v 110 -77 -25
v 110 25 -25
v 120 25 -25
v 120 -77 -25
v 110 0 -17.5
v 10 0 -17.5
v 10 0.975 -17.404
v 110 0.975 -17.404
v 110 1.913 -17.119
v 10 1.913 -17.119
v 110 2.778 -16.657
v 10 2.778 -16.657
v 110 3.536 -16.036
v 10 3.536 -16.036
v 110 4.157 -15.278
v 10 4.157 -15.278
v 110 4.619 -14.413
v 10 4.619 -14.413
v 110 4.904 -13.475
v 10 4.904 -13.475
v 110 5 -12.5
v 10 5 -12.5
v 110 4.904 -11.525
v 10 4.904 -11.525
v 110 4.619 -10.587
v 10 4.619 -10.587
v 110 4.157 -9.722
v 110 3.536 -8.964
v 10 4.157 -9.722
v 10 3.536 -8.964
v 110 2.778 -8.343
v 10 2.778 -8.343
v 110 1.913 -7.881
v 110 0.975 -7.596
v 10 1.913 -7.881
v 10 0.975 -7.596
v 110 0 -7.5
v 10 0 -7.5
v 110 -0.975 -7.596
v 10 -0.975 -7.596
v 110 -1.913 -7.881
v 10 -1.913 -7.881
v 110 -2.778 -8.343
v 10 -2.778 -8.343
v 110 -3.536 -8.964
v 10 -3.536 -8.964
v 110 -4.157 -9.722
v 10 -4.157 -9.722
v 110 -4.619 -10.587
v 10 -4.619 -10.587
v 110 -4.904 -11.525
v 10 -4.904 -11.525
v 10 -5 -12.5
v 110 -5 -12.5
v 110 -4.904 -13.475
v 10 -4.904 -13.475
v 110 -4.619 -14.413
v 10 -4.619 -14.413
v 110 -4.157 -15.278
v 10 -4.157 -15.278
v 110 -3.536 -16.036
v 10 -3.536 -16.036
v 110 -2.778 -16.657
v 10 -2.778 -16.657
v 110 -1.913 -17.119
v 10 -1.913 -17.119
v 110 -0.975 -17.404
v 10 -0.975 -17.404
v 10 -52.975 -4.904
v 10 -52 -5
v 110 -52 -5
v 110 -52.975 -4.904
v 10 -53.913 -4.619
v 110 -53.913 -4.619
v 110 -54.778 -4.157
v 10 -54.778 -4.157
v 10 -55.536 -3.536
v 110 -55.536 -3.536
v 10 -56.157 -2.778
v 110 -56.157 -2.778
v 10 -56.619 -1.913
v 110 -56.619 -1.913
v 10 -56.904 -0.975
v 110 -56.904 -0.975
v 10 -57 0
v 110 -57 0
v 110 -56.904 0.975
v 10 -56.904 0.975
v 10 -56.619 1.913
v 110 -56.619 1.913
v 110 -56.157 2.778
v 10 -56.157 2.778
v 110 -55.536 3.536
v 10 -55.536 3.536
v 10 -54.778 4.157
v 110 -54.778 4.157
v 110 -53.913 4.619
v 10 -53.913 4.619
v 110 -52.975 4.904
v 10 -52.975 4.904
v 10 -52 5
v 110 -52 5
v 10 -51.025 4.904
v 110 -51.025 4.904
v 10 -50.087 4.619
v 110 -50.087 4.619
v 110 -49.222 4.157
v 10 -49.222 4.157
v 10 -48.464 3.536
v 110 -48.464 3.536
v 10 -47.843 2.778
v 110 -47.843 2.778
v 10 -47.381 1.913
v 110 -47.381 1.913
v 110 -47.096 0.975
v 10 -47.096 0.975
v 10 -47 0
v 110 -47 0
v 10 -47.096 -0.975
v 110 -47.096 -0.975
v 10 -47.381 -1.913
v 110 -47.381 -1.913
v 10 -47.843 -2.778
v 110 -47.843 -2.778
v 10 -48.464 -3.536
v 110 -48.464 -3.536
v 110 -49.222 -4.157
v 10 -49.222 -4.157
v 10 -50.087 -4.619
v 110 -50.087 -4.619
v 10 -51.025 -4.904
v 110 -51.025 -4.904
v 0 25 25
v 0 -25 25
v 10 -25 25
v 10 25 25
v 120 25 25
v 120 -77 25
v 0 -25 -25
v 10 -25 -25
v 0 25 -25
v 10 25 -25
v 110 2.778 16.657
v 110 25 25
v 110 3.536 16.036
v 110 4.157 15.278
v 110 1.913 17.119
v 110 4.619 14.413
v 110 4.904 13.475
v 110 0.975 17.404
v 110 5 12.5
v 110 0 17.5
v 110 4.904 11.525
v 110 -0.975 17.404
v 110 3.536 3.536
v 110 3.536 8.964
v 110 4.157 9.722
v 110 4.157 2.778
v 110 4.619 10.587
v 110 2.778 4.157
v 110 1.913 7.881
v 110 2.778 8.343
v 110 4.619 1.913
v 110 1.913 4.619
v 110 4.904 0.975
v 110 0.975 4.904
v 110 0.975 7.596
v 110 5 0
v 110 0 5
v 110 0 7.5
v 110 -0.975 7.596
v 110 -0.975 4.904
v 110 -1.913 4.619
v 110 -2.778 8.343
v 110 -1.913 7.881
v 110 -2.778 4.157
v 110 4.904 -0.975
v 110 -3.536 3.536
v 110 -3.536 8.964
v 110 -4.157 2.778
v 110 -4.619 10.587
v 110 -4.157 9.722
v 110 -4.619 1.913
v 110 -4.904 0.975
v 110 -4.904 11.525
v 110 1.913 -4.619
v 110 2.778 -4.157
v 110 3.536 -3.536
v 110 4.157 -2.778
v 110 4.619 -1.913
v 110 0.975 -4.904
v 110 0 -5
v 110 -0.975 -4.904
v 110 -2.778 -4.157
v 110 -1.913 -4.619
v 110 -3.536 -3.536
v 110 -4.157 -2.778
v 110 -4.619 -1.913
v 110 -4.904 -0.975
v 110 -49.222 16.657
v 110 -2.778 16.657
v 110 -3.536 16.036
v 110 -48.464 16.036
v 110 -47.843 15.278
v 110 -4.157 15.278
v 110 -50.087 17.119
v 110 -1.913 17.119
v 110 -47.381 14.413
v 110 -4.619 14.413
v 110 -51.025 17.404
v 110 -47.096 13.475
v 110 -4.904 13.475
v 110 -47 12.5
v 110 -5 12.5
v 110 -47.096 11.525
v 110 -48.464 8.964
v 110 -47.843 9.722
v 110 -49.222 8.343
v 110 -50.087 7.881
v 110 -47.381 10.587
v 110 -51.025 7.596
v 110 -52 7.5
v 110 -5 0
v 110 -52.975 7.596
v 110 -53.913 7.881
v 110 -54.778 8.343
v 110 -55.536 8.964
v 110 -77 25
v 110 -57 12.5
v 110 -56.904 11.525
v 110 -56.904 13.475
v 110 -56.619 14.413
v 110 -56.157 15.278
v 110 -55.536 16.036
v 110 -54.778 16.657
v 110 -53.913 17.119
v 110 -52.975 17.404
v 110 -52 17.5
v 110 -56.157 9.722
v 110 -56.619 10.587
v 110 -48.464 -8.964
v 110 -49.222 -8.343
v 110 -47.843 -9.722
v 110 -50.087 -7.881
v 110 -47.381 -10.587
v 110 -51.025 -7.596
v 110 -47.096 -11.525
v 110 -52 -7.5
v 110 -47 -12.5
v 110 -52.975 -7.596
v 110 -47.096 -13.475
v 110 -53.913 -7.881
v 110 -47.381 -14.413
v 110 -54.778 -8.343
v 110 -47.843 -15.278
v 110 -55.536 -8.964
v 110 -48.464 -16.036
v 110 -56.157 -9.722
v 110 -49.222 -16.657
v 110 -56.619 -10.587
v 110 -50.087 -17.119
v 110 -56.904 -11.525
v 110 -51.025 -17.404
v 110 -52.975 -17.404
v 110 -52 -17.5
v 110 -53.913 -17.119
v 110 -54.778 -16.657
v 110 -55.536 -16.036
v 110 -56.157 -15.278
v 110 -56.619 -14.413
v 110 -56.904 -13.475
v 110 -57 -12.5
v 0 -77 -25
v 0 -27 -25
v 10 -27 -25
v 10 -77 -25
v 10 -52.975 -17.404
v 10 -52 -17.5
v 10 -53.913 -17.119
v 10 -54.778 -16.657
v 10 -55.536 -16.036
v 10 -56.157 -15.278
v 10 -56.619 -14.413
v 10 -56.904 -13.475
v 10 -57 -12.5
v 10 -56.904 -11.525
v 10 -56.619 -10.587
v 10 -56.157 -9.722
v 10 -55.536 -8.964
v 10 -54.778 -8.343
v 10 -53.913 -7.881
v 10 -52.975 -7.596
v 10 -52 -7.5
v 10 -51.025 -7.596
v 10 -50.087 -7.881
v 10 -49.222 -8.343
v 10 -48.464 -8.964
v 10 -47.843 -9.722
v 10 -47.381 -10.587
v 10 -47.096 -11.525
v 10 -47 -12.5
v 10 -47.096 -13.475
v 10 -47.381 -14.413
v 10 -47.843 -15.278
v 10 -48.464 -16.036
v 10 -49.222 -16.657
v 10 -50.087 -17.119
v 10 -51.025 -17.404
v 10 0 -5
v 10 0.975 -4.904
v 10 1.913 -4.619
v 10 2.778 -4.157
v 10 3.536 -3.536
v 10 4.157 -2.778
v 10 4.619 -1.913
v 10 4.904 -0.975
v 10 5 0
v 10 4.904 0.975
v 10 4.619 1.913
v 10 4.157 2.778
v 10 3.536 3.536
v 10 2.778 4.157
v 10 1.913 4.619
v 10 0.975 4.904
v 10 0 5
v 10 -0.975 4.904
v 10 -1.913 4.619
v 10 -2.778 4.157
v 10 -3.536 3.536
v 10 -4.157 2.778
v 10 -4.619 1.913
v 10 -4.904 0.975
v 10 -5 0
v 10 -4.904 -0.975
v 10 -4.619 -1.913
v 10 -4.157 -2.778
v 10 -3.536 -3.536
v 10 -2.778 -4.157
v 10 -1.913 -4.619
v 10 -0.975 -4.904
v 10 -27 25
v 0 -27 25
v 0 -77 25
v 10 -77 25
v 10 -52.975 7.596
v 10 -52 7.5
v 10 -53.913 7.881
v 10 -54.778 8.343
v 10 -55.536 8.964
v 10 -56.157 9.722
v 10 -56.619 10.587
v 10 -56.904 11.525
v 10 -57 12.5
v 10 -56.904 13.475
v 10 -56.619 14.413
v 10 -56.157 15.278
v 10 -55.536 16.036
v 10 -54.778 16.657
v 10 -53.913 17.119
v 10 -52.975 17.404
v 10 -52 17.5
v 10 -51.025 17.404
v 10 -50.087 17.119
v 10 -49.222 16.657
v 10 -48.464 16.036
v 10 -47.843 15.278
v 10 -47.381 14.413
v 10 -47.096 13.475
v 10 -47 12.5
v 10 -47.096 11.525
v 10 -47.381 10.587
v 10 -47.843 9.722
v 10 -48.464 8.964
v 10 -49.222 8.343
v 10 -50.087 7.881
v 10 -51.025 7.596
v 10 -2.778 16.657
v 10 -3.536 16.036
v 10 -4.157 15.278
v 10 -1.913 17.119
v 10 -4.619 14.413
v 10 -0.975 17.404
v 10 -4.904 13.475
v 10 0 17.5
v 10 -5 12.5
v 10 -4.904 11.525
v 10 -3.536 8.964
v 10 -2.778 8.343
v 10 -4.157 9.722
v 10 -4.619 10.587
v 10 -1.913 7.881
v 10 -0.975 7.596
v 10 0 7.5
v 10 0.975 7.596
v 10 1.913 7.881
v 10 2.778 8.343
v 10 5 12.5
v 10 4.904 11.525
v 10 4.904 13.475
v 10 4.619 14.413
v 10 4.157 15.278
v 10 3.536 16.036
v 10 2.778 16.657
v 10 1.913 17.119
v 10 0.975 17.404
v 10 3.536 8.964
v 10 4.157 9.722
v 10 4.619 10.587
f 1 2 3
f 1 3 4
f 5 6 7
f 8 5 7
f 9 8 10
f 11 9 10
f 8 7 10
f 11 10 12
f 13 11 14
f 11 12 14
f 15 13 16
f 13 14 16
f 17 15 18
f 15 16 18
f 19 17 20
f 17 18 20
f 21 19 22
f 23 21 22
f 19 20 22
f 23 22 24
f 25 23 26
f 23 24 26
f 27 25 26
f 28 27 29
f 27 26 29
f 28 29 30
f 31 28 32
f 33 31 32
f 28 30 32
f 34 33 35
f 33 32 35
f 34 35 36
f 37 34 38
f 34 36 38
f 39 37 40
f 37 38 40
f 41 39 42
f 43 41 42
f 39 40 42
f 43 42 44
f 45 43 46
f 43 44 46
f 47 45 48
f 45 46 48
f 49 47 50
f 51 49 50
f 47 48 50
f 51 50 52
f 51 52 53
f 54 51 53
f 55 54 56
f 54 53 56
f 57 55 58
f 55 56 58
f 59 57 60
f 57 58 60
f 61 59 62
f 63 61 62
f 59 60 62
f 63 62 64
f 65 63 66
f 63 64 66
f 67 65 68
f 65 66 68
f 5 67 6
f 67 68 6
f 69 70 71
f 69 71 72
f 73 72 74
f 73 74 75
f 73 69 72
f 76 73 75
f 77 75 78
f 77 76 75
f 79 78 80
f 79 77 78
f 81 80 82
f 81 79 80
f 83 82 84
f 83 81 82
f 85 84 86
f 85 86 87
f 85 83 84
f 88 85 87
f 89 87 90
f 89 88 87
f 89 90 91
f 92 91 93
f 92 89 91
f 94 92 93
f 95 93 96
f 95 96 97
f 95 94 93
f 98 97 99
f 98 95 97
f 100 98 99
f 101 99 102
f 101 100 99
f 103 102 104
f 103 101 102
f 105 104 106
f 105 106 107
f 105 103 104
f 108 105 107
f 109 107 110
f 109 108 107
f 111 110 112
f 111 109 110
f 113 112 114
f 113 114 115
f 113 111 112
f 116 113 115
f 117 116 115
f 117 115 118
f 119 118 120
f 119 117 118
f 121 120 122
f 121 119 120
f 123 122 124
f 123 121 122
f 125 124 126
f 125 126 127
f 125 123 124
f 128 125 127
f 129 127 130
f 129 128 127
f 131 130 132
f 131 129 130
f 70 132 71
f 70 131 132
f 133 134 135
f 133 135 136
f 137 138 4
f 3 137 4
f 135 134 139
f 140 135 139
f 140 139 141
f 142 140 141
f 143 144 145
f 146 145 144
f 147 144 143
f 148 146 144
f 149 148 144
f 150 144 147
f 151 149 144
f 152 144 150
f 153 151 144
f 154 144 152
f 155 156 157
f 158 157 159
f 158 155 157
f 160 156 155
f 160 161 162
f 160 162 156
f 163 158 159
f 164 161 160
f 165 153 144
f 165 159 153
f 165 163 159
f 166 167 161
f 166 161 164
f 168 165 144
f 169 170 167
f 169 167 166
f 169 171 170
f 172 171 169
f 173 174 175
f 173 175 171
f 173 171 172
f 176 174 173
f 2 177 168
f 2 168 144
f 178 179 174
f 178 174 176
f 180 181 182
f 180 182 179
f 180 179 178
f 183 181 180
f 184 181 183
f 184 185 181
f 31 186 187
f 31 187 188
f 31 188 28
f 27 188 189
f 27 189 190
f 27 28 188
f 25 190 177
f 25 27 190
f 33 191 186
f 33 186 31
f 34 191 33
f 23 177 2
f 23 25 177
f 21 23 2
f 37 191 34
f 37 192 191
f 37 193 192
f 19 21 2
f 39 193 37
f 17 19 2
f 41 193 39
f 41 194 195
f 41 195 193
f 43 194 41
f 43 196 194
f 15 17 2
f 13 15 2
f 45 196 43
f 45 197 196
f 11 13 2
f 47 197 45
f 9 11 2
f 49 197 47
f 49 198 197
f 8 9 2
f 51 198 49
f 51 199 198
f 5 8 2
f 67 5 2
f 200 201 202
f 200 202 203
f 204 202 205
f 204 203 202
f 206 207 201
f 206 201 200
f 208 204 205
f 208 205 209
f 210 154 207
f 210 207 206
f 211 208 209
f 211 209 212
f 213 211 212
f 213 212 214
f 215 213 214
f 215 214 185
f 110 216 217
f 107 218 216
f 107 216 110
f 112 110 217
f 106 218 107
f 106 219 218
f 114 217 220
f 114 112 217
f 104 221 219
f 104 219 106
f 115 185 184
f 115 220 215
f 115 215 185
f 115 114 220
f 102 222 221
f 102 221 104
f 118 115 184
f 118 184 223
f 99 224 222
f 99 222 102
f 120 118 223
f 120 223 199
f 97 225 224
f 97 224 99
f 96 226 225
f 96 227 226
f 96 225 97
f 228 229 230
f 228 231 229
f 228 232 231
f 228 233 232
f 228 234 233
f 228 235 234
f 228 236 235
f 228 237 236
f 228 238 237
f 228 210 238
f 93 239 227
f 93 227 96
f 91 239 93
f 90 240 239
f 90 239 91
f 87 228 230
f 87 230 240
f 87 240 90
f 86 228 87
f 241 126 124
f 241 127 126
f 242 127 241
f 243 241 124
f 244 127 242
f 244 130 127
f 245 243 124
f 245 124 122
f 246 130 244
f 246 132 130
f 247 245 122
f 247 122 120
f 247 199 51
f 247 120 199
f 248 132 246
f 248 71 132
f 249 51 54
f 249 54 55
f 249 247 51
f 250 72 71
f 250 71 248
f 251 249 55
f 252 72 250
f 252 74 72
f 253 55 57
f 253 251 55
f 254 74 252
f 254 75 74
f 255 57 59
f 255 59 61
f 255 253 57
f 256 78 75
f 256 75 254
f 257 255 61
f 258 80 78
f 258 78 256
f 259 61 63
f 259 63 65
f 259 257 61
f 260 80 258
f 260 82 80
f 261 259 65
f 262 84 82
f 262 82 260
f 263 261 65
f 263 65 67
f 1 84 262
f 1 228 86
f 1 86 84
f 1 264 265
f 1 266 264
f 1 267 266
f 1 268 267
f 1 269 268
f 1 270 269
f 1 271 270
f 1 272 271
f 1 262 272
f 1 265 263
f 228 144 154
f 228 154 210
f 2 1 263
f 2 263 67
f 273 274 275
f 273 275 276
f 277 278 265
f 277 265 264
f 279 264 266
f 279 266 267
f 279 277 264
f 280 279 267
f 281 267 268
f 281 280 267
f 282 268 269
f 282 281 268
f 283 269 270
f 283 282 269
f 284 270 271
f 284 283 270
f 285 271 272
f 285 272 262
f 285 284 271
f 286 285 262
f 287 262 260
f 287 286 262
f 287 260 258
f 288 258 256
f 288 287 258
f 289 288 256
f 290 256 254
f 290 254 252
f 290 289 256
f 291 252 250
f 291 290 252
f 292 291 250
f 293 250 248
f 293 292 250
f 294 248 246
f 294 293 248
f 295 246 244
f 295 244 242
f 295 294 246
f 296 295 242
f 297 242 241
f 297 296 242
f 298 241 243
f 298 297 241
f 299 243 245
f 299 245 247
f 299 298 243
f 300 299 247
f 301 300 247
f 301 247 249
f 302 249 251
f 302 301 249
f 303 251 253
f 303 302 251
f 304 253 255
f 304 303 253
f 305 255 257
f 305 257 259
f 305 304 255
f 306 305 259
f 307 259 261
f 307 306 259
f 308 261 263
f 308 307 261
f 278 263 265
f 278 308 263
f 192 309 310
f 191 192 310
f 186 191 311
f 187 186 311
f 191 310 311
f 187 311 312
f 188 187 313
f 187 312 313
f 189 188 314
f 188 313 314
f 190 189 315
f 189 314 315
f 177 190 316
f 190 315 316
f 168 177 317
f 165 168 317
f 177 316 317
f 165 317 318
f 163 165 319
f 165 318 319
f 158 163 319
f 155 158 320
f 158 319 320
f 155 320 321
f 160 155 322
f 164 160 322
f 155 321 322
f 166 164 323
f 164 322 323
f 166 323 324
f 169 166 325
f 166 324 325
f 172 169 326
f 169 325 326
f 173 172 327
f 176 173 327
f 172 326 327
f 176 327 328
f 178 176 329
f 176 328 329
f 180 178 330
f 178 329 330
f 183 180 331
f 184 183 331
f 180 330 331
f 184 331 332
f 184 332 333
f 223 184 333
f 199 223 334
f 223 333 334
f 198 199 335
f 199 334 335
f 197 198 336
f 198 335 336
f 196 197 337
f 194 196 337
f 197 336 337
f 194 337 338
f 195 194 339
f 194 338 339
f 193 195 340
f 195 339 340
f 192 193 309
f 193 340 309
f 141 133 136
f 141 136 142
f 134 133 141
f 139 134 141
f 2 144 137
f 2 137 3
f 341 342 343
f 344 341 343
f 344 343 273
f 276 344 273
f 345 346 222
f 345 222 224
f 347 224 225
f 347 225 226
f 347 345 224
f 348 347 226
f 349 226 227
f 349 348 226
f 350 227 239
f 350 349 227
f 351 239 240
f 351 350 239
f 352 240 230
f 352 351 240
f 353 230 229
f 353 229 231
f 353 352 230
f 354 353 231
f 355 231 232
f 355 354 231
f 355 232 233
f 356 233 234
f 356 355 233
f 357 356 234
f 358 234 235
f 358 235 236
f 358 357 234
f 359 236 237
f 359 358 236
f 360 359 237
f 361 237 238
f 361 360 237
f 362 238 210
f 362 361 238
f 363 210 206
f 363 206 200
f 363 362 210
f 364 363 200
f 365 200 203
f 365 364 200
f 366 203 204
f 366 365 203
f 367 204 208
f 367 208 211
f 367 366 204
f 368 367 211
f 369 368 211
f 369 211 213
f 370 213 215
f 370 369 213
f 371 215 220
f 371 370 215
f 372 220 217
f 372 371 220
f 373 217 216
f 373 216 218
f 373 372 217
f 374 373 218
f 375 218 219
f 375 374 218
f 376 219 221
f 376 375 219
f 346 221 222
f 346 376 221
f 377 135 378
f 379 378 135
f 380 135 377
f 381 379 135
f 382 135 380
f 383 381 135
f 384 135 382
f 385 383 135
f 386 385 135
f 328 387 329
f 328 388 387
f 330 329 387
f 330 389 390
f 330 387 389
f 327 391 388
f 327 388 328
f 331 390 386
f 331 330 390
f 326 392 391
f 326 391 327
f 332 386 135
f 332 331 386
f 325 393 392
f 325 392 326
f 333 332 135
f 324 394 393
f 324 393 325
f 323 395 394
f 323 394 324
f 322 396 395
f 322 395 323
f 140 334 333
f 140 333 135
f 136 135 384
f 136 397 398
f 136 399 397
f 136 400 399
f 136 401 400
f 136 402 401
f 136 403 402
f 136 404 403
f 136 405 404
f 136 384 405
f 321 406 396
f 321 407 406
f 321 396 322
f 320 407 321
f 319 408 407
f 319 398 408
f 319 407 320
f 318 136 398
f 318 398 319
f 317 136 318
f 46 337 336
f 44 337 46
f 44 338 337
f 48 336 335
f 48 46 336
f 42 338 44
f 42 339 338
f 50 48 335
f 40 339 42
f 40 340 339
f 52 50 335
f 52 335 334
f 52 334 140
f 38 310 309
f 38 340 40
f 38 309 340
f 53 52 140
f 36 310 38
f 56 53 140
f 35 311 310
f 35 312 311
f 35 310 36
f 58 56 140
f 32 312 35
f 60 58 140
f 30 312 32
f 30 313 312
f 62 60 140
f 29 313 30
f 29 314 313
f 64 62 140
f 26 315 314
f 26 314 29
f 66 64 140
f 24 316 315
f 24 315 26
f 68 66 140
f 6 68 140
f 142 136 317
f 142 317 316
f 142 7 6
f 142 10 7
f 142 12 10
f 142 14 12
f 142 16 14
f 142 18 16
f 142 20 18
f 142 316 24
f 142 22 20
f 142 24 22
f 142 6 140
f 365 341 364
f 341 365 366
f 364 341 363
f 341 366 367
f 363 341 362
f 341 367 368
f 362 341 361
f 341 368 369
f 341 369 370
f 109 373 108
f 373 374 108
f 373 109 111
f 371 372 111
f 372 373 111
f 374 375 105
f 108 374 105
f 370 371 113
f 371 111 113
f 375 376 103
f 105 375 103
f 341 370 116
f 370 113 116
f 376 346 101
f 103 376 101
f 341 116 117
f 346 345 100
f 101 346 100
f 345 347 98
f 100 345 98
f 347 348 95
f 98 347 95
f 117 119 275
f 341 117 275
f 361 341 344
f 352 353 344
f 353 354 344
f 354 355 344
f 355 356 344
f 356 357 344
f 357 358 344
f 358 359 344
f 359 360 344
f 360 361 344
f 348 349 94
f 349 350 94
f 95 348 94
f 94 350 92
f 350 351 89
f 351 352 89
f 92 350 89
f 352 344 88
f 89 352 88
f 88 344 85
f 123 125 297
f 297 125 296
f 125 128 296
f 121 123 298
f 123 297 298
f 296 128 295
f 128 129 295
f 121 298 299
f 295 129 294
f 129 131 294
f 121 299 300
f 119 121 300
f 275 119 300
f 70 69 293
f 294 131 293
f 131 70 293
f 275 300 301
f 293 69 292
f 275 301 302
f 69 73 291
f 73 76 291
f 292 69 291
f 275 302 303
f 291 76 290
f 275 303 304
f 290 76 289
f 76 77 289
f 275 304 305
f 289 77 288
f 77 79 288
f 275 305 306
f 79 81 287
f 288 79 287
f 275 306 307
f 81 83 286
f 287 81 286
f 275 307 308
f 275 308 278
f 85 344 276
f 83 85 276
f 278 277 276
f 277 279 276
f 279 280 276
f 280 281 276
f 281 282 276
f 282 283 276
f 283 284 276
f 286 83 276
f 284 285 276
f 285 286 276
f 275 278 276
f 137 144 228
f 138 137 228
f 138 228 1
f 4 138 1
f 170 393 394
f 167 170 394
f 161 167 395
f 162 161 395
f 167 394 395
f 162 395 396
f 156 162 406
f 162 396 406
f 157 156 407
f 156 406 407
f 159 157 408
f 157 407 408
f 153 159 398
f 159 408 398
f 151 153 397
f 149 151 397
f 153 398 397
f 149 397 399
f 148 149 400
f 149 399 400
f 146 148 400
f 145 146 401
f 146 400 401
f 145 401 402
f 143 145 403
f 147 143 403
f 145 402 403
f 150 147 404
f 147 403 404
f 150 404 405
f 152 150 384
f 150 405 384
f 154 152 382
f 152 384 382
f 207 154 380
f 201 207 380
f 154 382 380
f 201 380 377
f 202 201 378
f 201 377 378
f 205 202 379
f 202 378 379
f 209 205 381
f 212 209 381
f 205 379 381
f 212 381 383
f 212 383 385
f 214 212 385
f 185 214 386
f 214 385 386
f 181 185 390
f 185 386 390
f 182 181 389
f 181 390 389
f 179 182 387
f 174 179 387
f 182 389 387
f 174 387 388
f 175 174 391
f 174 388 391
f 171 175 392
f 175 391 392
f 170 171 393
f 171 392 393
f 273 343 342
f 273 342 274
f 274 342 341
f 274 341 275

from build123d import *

# Parameters (mm, degrees)
BASEPLATESKETCH_W   = 50
BASEPLATESKETCH_H   = 50
BOSS_EXTRUDE1_DEPTH = 10
SKETCH2_R           = 5
BOSS_EXTRUDE3_DEPTH = 100
LPATTERN1_COUNT     = 2
LPATTERN1_PITCH     = 12.5
LPATTERN1_COL_COUNT = 2
LPATTERN1_COL_PITCH = 12.5
SKETCH7_W           = 50
SKETCH7_H           = 51
BOSS_EXTRUDE4_DEPTH = 10


with BuildPart() as part:
    # baseplatesketch → Boss-Extrude1 (new body)
    with BuildSketch(Plane(origin=(0, 0, 0), x_dir=(0, 0, -1), z_dir=(1, 0, 0))):
        Rectangle(BASEPLATESKETCH_W, BASEPLATESKETCH_H)
    extrude(amount=BOSS_EXTRUDE1_DEPTH)

    # Sketch2 → Boss-Extrude3 (add)
    with BuildSketch(Plane(origin=(10, 0, 0), x_dir=(0, 0, -1), z_dir=(1, 0, 0))):
        Circle(SKETCH2_R)
    boss_extrude3 = extrude(amount=BOSS_EXTRUDE3_DEPTH)

    # LPattern1: Boss-Extrude3 ×2
    with Locations(*[(0, 0, -i * LPATTERN1_PITCH) for i in range(1, LPATTERN1_COUNT)]):
        add(boss_extrude3)

    # LPattern1 col: Boss-Extrude3 ×2
    with Locations(*[(0, 0, i * LPATTERN1_COL_PITCH) for i in range(1, LPATTERN1_COL_COUNT)]):
        add(boss_extrude3)

    # Sketch7 → Boss-Extrude4 (add)
    with BuildSketch(Plane(origin=(110, 0, 0), x_dir=(0, 0, -1), z_dir=(1, 0, 0))):
        with Locations((0, -0.5)):
            Rectangle(SKETCH7_W, SKETCH7_H)
    extrude(amount=BOSS_EXTRUDE4_DEPTH)

    # Mirror8: part across plane


with BuildPart() as part_1:
    add(part.part)
    add(part.part.mirror(Plane(origin=(0, -26, 0), x_dir=(0, 0, 1), z_dir=(0, -1, 0))))


solid = part_1.part
